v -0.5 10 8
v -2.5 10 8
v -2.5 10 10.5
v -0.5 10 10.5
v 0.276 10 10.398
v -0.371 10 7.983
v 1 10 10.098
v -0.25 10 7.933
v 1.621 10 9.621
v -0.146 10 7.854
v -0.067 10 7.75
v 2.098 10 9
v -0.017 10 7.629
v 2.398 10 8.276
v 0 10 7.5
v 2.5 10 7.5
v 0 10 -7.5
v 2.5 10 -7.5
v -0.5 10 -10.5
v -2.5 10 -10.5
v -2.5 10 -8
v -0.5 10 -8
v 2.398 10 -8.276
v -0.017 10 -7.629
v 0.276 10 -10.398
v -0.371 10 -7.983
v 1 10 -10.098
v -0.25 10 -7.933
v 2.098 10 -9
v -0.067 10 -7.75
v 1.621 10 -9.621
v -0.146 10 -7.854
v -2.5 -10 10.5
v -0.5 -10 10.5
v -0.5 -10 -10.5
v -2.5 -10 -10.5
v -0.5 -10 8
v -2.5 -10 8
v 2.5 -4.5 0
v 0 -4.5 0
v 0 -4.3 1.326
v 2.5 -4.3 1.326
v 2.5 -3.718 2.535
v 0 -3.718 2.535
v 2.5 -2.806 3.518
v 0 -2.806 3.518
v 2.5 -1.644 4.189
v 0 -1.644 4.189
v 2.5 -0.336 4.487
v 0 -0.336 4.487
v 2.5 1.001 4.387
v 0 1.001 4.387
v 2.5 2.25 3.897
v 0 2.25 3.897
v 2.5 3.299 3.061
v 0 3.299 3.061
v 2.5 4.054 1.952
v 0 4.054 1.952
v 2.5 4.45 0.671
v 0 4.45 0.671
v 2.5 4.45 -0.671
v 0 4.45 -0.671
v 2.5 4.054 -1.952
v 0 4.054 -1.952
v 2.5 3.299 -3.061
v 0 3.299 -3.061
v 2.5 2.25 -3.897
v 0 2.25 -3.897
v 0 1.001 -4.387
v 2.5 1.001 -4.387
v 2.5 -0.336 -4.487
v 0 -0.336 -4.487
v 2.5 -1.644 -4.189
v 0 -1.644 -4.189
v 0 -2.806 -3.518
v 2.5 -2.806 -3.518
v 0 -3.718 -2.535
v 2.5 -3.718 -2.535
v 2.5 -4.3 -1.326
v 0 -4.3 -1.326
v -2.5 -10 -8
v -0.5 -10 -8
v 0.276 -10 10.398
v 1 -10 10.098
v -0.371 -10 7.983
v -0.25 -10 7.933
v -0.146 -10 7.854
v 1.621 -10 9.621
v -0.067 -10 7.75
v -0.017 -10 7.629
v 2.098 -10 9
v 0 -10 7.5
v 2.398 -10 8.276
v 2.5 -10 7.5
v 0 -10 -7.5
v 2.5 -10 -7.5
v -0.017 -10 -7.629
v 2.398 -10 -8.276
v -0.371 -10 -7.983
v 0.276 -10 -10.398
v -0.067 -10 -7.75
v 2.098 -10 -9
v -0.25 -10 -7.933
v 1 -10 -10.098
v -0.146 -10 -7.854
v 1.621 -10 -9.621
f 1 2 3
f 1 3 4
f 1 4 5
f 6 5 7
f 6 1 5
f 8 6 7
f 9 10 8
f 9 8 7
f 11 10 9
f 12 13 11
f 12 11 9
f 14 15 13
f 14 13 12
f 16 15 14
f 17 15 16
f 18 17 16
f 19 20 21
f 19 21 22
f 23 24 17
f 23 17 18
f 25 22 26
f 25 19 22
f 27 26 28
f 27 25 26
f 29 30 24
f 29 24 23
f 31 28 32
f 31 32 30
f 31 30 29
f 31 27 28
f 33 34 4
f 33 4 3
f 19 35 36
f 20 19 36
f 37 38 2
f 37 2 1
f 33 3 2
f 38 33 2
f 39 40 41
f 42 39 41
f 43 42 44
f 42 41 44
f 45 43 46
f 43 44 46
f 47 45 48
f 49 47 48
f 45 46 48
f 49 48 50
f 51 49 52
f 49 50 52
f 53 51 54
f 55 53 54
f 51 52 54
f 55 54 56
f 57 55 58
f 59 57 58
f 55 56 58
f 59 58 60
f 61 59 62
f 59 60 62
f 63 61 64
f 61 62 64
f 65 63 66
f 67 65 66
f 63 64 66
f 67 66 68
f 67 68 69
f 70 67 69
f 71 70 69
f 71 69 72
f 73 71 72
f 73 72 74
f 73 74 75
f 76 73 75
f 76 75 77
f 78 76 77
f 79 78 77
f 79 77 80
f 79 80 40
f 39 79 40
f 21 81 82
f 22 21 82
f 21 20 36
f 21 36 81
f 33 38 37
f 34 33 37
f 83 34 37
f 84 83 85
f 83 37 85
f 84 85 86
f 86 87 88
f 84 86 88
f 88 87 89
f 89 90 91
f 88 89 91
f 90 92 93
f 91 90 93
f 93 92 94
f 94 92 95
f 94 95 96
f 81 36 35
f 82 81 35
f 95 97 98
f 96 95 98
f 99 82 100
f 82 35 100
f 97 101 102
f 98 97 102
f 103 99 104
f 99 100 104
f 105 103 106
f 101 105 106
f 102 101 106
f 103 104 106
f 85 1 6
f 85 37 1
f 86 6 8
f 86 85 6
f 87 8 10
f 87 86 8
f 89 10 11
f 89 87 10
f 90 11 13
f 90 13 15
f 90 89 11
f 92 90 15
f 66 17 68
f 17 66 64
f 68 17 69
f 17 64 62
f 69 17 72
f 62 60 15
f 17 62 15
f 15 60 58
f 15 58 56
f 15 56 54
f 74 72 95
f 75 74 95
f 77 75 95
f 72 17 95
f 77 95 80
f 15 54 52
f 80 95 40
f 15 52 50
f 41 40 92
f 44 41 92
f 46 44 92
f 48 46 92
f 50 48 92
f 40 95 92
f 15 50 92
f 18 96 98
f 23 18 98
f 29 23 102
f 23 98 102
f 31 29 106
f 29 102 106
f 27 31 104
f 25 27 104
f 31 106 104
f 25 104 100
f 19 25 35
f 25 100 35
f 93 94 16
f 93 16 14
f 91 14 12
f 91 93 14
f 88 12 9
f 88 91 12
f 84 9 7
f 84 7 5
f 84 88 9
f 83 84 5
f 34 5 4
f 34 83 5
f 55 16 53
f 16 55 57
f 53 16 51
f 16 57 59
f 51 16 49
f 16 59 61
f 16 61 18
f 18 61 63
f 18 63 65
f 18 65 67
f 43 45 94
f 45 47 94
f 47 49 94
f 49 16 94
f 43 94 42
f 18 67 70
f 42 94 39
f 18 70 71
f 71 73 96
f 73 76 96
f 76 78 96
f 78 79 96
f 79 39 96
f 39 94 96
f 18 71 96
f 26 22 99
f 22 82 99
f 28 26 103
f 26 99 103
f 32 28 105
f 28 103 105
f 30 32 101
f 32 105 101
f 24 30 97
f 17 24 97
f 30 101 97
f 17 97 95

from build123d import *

# Parameters (mm, degrees)
F1_DEPTH      = 10
F1_DEPTH_BACK = 10
F4_D          = 9


with BuildPart() as f1:
    # F0 (on Front) → F1 (new body, two sides)
    with BuildSketch(Plane.XZ) as f1_sk:
        with BuildLine():
            Line((0, 0), (2.5, 0))
            Line((2.5, 0), (2.5, 7.5))
            ThreePointArc((2.5, 7.5), (1.62132, 9.62132), (-0.5, 10.5))
            Line((-0.5, 10.5), (-2.5, 10.5))
            Line((-2.5, 10.5), (-2.5, 8))
            Line((-2.5, 8), (-0.5, 8))
            ThreePointArc((-0.5, 8), (-0.146447, 7.853553), (0, 7.5))
            Line((0, 7.5), (0, 0))
        make_face()
    extrude(amount=F1_DEPTH)
    extrude(f1_sk.sketch, amount=-F1_DEPTH_BACK)

    # F2: F1 across face


with BuildPart() as f1_1:
    add(f1.part)
    add(f1.part.mirror(Plane(origin=(1.25, 0, 0), x_dir=(1, 0, 0), z_dir=(0, 0, -1))))

    # F4 (through all)
    with Locations(Plane.YZ.offset(2.5)):
        with Locations((0, 0)):
            Hole(F4_D / 2)


solid = f1_1.part
